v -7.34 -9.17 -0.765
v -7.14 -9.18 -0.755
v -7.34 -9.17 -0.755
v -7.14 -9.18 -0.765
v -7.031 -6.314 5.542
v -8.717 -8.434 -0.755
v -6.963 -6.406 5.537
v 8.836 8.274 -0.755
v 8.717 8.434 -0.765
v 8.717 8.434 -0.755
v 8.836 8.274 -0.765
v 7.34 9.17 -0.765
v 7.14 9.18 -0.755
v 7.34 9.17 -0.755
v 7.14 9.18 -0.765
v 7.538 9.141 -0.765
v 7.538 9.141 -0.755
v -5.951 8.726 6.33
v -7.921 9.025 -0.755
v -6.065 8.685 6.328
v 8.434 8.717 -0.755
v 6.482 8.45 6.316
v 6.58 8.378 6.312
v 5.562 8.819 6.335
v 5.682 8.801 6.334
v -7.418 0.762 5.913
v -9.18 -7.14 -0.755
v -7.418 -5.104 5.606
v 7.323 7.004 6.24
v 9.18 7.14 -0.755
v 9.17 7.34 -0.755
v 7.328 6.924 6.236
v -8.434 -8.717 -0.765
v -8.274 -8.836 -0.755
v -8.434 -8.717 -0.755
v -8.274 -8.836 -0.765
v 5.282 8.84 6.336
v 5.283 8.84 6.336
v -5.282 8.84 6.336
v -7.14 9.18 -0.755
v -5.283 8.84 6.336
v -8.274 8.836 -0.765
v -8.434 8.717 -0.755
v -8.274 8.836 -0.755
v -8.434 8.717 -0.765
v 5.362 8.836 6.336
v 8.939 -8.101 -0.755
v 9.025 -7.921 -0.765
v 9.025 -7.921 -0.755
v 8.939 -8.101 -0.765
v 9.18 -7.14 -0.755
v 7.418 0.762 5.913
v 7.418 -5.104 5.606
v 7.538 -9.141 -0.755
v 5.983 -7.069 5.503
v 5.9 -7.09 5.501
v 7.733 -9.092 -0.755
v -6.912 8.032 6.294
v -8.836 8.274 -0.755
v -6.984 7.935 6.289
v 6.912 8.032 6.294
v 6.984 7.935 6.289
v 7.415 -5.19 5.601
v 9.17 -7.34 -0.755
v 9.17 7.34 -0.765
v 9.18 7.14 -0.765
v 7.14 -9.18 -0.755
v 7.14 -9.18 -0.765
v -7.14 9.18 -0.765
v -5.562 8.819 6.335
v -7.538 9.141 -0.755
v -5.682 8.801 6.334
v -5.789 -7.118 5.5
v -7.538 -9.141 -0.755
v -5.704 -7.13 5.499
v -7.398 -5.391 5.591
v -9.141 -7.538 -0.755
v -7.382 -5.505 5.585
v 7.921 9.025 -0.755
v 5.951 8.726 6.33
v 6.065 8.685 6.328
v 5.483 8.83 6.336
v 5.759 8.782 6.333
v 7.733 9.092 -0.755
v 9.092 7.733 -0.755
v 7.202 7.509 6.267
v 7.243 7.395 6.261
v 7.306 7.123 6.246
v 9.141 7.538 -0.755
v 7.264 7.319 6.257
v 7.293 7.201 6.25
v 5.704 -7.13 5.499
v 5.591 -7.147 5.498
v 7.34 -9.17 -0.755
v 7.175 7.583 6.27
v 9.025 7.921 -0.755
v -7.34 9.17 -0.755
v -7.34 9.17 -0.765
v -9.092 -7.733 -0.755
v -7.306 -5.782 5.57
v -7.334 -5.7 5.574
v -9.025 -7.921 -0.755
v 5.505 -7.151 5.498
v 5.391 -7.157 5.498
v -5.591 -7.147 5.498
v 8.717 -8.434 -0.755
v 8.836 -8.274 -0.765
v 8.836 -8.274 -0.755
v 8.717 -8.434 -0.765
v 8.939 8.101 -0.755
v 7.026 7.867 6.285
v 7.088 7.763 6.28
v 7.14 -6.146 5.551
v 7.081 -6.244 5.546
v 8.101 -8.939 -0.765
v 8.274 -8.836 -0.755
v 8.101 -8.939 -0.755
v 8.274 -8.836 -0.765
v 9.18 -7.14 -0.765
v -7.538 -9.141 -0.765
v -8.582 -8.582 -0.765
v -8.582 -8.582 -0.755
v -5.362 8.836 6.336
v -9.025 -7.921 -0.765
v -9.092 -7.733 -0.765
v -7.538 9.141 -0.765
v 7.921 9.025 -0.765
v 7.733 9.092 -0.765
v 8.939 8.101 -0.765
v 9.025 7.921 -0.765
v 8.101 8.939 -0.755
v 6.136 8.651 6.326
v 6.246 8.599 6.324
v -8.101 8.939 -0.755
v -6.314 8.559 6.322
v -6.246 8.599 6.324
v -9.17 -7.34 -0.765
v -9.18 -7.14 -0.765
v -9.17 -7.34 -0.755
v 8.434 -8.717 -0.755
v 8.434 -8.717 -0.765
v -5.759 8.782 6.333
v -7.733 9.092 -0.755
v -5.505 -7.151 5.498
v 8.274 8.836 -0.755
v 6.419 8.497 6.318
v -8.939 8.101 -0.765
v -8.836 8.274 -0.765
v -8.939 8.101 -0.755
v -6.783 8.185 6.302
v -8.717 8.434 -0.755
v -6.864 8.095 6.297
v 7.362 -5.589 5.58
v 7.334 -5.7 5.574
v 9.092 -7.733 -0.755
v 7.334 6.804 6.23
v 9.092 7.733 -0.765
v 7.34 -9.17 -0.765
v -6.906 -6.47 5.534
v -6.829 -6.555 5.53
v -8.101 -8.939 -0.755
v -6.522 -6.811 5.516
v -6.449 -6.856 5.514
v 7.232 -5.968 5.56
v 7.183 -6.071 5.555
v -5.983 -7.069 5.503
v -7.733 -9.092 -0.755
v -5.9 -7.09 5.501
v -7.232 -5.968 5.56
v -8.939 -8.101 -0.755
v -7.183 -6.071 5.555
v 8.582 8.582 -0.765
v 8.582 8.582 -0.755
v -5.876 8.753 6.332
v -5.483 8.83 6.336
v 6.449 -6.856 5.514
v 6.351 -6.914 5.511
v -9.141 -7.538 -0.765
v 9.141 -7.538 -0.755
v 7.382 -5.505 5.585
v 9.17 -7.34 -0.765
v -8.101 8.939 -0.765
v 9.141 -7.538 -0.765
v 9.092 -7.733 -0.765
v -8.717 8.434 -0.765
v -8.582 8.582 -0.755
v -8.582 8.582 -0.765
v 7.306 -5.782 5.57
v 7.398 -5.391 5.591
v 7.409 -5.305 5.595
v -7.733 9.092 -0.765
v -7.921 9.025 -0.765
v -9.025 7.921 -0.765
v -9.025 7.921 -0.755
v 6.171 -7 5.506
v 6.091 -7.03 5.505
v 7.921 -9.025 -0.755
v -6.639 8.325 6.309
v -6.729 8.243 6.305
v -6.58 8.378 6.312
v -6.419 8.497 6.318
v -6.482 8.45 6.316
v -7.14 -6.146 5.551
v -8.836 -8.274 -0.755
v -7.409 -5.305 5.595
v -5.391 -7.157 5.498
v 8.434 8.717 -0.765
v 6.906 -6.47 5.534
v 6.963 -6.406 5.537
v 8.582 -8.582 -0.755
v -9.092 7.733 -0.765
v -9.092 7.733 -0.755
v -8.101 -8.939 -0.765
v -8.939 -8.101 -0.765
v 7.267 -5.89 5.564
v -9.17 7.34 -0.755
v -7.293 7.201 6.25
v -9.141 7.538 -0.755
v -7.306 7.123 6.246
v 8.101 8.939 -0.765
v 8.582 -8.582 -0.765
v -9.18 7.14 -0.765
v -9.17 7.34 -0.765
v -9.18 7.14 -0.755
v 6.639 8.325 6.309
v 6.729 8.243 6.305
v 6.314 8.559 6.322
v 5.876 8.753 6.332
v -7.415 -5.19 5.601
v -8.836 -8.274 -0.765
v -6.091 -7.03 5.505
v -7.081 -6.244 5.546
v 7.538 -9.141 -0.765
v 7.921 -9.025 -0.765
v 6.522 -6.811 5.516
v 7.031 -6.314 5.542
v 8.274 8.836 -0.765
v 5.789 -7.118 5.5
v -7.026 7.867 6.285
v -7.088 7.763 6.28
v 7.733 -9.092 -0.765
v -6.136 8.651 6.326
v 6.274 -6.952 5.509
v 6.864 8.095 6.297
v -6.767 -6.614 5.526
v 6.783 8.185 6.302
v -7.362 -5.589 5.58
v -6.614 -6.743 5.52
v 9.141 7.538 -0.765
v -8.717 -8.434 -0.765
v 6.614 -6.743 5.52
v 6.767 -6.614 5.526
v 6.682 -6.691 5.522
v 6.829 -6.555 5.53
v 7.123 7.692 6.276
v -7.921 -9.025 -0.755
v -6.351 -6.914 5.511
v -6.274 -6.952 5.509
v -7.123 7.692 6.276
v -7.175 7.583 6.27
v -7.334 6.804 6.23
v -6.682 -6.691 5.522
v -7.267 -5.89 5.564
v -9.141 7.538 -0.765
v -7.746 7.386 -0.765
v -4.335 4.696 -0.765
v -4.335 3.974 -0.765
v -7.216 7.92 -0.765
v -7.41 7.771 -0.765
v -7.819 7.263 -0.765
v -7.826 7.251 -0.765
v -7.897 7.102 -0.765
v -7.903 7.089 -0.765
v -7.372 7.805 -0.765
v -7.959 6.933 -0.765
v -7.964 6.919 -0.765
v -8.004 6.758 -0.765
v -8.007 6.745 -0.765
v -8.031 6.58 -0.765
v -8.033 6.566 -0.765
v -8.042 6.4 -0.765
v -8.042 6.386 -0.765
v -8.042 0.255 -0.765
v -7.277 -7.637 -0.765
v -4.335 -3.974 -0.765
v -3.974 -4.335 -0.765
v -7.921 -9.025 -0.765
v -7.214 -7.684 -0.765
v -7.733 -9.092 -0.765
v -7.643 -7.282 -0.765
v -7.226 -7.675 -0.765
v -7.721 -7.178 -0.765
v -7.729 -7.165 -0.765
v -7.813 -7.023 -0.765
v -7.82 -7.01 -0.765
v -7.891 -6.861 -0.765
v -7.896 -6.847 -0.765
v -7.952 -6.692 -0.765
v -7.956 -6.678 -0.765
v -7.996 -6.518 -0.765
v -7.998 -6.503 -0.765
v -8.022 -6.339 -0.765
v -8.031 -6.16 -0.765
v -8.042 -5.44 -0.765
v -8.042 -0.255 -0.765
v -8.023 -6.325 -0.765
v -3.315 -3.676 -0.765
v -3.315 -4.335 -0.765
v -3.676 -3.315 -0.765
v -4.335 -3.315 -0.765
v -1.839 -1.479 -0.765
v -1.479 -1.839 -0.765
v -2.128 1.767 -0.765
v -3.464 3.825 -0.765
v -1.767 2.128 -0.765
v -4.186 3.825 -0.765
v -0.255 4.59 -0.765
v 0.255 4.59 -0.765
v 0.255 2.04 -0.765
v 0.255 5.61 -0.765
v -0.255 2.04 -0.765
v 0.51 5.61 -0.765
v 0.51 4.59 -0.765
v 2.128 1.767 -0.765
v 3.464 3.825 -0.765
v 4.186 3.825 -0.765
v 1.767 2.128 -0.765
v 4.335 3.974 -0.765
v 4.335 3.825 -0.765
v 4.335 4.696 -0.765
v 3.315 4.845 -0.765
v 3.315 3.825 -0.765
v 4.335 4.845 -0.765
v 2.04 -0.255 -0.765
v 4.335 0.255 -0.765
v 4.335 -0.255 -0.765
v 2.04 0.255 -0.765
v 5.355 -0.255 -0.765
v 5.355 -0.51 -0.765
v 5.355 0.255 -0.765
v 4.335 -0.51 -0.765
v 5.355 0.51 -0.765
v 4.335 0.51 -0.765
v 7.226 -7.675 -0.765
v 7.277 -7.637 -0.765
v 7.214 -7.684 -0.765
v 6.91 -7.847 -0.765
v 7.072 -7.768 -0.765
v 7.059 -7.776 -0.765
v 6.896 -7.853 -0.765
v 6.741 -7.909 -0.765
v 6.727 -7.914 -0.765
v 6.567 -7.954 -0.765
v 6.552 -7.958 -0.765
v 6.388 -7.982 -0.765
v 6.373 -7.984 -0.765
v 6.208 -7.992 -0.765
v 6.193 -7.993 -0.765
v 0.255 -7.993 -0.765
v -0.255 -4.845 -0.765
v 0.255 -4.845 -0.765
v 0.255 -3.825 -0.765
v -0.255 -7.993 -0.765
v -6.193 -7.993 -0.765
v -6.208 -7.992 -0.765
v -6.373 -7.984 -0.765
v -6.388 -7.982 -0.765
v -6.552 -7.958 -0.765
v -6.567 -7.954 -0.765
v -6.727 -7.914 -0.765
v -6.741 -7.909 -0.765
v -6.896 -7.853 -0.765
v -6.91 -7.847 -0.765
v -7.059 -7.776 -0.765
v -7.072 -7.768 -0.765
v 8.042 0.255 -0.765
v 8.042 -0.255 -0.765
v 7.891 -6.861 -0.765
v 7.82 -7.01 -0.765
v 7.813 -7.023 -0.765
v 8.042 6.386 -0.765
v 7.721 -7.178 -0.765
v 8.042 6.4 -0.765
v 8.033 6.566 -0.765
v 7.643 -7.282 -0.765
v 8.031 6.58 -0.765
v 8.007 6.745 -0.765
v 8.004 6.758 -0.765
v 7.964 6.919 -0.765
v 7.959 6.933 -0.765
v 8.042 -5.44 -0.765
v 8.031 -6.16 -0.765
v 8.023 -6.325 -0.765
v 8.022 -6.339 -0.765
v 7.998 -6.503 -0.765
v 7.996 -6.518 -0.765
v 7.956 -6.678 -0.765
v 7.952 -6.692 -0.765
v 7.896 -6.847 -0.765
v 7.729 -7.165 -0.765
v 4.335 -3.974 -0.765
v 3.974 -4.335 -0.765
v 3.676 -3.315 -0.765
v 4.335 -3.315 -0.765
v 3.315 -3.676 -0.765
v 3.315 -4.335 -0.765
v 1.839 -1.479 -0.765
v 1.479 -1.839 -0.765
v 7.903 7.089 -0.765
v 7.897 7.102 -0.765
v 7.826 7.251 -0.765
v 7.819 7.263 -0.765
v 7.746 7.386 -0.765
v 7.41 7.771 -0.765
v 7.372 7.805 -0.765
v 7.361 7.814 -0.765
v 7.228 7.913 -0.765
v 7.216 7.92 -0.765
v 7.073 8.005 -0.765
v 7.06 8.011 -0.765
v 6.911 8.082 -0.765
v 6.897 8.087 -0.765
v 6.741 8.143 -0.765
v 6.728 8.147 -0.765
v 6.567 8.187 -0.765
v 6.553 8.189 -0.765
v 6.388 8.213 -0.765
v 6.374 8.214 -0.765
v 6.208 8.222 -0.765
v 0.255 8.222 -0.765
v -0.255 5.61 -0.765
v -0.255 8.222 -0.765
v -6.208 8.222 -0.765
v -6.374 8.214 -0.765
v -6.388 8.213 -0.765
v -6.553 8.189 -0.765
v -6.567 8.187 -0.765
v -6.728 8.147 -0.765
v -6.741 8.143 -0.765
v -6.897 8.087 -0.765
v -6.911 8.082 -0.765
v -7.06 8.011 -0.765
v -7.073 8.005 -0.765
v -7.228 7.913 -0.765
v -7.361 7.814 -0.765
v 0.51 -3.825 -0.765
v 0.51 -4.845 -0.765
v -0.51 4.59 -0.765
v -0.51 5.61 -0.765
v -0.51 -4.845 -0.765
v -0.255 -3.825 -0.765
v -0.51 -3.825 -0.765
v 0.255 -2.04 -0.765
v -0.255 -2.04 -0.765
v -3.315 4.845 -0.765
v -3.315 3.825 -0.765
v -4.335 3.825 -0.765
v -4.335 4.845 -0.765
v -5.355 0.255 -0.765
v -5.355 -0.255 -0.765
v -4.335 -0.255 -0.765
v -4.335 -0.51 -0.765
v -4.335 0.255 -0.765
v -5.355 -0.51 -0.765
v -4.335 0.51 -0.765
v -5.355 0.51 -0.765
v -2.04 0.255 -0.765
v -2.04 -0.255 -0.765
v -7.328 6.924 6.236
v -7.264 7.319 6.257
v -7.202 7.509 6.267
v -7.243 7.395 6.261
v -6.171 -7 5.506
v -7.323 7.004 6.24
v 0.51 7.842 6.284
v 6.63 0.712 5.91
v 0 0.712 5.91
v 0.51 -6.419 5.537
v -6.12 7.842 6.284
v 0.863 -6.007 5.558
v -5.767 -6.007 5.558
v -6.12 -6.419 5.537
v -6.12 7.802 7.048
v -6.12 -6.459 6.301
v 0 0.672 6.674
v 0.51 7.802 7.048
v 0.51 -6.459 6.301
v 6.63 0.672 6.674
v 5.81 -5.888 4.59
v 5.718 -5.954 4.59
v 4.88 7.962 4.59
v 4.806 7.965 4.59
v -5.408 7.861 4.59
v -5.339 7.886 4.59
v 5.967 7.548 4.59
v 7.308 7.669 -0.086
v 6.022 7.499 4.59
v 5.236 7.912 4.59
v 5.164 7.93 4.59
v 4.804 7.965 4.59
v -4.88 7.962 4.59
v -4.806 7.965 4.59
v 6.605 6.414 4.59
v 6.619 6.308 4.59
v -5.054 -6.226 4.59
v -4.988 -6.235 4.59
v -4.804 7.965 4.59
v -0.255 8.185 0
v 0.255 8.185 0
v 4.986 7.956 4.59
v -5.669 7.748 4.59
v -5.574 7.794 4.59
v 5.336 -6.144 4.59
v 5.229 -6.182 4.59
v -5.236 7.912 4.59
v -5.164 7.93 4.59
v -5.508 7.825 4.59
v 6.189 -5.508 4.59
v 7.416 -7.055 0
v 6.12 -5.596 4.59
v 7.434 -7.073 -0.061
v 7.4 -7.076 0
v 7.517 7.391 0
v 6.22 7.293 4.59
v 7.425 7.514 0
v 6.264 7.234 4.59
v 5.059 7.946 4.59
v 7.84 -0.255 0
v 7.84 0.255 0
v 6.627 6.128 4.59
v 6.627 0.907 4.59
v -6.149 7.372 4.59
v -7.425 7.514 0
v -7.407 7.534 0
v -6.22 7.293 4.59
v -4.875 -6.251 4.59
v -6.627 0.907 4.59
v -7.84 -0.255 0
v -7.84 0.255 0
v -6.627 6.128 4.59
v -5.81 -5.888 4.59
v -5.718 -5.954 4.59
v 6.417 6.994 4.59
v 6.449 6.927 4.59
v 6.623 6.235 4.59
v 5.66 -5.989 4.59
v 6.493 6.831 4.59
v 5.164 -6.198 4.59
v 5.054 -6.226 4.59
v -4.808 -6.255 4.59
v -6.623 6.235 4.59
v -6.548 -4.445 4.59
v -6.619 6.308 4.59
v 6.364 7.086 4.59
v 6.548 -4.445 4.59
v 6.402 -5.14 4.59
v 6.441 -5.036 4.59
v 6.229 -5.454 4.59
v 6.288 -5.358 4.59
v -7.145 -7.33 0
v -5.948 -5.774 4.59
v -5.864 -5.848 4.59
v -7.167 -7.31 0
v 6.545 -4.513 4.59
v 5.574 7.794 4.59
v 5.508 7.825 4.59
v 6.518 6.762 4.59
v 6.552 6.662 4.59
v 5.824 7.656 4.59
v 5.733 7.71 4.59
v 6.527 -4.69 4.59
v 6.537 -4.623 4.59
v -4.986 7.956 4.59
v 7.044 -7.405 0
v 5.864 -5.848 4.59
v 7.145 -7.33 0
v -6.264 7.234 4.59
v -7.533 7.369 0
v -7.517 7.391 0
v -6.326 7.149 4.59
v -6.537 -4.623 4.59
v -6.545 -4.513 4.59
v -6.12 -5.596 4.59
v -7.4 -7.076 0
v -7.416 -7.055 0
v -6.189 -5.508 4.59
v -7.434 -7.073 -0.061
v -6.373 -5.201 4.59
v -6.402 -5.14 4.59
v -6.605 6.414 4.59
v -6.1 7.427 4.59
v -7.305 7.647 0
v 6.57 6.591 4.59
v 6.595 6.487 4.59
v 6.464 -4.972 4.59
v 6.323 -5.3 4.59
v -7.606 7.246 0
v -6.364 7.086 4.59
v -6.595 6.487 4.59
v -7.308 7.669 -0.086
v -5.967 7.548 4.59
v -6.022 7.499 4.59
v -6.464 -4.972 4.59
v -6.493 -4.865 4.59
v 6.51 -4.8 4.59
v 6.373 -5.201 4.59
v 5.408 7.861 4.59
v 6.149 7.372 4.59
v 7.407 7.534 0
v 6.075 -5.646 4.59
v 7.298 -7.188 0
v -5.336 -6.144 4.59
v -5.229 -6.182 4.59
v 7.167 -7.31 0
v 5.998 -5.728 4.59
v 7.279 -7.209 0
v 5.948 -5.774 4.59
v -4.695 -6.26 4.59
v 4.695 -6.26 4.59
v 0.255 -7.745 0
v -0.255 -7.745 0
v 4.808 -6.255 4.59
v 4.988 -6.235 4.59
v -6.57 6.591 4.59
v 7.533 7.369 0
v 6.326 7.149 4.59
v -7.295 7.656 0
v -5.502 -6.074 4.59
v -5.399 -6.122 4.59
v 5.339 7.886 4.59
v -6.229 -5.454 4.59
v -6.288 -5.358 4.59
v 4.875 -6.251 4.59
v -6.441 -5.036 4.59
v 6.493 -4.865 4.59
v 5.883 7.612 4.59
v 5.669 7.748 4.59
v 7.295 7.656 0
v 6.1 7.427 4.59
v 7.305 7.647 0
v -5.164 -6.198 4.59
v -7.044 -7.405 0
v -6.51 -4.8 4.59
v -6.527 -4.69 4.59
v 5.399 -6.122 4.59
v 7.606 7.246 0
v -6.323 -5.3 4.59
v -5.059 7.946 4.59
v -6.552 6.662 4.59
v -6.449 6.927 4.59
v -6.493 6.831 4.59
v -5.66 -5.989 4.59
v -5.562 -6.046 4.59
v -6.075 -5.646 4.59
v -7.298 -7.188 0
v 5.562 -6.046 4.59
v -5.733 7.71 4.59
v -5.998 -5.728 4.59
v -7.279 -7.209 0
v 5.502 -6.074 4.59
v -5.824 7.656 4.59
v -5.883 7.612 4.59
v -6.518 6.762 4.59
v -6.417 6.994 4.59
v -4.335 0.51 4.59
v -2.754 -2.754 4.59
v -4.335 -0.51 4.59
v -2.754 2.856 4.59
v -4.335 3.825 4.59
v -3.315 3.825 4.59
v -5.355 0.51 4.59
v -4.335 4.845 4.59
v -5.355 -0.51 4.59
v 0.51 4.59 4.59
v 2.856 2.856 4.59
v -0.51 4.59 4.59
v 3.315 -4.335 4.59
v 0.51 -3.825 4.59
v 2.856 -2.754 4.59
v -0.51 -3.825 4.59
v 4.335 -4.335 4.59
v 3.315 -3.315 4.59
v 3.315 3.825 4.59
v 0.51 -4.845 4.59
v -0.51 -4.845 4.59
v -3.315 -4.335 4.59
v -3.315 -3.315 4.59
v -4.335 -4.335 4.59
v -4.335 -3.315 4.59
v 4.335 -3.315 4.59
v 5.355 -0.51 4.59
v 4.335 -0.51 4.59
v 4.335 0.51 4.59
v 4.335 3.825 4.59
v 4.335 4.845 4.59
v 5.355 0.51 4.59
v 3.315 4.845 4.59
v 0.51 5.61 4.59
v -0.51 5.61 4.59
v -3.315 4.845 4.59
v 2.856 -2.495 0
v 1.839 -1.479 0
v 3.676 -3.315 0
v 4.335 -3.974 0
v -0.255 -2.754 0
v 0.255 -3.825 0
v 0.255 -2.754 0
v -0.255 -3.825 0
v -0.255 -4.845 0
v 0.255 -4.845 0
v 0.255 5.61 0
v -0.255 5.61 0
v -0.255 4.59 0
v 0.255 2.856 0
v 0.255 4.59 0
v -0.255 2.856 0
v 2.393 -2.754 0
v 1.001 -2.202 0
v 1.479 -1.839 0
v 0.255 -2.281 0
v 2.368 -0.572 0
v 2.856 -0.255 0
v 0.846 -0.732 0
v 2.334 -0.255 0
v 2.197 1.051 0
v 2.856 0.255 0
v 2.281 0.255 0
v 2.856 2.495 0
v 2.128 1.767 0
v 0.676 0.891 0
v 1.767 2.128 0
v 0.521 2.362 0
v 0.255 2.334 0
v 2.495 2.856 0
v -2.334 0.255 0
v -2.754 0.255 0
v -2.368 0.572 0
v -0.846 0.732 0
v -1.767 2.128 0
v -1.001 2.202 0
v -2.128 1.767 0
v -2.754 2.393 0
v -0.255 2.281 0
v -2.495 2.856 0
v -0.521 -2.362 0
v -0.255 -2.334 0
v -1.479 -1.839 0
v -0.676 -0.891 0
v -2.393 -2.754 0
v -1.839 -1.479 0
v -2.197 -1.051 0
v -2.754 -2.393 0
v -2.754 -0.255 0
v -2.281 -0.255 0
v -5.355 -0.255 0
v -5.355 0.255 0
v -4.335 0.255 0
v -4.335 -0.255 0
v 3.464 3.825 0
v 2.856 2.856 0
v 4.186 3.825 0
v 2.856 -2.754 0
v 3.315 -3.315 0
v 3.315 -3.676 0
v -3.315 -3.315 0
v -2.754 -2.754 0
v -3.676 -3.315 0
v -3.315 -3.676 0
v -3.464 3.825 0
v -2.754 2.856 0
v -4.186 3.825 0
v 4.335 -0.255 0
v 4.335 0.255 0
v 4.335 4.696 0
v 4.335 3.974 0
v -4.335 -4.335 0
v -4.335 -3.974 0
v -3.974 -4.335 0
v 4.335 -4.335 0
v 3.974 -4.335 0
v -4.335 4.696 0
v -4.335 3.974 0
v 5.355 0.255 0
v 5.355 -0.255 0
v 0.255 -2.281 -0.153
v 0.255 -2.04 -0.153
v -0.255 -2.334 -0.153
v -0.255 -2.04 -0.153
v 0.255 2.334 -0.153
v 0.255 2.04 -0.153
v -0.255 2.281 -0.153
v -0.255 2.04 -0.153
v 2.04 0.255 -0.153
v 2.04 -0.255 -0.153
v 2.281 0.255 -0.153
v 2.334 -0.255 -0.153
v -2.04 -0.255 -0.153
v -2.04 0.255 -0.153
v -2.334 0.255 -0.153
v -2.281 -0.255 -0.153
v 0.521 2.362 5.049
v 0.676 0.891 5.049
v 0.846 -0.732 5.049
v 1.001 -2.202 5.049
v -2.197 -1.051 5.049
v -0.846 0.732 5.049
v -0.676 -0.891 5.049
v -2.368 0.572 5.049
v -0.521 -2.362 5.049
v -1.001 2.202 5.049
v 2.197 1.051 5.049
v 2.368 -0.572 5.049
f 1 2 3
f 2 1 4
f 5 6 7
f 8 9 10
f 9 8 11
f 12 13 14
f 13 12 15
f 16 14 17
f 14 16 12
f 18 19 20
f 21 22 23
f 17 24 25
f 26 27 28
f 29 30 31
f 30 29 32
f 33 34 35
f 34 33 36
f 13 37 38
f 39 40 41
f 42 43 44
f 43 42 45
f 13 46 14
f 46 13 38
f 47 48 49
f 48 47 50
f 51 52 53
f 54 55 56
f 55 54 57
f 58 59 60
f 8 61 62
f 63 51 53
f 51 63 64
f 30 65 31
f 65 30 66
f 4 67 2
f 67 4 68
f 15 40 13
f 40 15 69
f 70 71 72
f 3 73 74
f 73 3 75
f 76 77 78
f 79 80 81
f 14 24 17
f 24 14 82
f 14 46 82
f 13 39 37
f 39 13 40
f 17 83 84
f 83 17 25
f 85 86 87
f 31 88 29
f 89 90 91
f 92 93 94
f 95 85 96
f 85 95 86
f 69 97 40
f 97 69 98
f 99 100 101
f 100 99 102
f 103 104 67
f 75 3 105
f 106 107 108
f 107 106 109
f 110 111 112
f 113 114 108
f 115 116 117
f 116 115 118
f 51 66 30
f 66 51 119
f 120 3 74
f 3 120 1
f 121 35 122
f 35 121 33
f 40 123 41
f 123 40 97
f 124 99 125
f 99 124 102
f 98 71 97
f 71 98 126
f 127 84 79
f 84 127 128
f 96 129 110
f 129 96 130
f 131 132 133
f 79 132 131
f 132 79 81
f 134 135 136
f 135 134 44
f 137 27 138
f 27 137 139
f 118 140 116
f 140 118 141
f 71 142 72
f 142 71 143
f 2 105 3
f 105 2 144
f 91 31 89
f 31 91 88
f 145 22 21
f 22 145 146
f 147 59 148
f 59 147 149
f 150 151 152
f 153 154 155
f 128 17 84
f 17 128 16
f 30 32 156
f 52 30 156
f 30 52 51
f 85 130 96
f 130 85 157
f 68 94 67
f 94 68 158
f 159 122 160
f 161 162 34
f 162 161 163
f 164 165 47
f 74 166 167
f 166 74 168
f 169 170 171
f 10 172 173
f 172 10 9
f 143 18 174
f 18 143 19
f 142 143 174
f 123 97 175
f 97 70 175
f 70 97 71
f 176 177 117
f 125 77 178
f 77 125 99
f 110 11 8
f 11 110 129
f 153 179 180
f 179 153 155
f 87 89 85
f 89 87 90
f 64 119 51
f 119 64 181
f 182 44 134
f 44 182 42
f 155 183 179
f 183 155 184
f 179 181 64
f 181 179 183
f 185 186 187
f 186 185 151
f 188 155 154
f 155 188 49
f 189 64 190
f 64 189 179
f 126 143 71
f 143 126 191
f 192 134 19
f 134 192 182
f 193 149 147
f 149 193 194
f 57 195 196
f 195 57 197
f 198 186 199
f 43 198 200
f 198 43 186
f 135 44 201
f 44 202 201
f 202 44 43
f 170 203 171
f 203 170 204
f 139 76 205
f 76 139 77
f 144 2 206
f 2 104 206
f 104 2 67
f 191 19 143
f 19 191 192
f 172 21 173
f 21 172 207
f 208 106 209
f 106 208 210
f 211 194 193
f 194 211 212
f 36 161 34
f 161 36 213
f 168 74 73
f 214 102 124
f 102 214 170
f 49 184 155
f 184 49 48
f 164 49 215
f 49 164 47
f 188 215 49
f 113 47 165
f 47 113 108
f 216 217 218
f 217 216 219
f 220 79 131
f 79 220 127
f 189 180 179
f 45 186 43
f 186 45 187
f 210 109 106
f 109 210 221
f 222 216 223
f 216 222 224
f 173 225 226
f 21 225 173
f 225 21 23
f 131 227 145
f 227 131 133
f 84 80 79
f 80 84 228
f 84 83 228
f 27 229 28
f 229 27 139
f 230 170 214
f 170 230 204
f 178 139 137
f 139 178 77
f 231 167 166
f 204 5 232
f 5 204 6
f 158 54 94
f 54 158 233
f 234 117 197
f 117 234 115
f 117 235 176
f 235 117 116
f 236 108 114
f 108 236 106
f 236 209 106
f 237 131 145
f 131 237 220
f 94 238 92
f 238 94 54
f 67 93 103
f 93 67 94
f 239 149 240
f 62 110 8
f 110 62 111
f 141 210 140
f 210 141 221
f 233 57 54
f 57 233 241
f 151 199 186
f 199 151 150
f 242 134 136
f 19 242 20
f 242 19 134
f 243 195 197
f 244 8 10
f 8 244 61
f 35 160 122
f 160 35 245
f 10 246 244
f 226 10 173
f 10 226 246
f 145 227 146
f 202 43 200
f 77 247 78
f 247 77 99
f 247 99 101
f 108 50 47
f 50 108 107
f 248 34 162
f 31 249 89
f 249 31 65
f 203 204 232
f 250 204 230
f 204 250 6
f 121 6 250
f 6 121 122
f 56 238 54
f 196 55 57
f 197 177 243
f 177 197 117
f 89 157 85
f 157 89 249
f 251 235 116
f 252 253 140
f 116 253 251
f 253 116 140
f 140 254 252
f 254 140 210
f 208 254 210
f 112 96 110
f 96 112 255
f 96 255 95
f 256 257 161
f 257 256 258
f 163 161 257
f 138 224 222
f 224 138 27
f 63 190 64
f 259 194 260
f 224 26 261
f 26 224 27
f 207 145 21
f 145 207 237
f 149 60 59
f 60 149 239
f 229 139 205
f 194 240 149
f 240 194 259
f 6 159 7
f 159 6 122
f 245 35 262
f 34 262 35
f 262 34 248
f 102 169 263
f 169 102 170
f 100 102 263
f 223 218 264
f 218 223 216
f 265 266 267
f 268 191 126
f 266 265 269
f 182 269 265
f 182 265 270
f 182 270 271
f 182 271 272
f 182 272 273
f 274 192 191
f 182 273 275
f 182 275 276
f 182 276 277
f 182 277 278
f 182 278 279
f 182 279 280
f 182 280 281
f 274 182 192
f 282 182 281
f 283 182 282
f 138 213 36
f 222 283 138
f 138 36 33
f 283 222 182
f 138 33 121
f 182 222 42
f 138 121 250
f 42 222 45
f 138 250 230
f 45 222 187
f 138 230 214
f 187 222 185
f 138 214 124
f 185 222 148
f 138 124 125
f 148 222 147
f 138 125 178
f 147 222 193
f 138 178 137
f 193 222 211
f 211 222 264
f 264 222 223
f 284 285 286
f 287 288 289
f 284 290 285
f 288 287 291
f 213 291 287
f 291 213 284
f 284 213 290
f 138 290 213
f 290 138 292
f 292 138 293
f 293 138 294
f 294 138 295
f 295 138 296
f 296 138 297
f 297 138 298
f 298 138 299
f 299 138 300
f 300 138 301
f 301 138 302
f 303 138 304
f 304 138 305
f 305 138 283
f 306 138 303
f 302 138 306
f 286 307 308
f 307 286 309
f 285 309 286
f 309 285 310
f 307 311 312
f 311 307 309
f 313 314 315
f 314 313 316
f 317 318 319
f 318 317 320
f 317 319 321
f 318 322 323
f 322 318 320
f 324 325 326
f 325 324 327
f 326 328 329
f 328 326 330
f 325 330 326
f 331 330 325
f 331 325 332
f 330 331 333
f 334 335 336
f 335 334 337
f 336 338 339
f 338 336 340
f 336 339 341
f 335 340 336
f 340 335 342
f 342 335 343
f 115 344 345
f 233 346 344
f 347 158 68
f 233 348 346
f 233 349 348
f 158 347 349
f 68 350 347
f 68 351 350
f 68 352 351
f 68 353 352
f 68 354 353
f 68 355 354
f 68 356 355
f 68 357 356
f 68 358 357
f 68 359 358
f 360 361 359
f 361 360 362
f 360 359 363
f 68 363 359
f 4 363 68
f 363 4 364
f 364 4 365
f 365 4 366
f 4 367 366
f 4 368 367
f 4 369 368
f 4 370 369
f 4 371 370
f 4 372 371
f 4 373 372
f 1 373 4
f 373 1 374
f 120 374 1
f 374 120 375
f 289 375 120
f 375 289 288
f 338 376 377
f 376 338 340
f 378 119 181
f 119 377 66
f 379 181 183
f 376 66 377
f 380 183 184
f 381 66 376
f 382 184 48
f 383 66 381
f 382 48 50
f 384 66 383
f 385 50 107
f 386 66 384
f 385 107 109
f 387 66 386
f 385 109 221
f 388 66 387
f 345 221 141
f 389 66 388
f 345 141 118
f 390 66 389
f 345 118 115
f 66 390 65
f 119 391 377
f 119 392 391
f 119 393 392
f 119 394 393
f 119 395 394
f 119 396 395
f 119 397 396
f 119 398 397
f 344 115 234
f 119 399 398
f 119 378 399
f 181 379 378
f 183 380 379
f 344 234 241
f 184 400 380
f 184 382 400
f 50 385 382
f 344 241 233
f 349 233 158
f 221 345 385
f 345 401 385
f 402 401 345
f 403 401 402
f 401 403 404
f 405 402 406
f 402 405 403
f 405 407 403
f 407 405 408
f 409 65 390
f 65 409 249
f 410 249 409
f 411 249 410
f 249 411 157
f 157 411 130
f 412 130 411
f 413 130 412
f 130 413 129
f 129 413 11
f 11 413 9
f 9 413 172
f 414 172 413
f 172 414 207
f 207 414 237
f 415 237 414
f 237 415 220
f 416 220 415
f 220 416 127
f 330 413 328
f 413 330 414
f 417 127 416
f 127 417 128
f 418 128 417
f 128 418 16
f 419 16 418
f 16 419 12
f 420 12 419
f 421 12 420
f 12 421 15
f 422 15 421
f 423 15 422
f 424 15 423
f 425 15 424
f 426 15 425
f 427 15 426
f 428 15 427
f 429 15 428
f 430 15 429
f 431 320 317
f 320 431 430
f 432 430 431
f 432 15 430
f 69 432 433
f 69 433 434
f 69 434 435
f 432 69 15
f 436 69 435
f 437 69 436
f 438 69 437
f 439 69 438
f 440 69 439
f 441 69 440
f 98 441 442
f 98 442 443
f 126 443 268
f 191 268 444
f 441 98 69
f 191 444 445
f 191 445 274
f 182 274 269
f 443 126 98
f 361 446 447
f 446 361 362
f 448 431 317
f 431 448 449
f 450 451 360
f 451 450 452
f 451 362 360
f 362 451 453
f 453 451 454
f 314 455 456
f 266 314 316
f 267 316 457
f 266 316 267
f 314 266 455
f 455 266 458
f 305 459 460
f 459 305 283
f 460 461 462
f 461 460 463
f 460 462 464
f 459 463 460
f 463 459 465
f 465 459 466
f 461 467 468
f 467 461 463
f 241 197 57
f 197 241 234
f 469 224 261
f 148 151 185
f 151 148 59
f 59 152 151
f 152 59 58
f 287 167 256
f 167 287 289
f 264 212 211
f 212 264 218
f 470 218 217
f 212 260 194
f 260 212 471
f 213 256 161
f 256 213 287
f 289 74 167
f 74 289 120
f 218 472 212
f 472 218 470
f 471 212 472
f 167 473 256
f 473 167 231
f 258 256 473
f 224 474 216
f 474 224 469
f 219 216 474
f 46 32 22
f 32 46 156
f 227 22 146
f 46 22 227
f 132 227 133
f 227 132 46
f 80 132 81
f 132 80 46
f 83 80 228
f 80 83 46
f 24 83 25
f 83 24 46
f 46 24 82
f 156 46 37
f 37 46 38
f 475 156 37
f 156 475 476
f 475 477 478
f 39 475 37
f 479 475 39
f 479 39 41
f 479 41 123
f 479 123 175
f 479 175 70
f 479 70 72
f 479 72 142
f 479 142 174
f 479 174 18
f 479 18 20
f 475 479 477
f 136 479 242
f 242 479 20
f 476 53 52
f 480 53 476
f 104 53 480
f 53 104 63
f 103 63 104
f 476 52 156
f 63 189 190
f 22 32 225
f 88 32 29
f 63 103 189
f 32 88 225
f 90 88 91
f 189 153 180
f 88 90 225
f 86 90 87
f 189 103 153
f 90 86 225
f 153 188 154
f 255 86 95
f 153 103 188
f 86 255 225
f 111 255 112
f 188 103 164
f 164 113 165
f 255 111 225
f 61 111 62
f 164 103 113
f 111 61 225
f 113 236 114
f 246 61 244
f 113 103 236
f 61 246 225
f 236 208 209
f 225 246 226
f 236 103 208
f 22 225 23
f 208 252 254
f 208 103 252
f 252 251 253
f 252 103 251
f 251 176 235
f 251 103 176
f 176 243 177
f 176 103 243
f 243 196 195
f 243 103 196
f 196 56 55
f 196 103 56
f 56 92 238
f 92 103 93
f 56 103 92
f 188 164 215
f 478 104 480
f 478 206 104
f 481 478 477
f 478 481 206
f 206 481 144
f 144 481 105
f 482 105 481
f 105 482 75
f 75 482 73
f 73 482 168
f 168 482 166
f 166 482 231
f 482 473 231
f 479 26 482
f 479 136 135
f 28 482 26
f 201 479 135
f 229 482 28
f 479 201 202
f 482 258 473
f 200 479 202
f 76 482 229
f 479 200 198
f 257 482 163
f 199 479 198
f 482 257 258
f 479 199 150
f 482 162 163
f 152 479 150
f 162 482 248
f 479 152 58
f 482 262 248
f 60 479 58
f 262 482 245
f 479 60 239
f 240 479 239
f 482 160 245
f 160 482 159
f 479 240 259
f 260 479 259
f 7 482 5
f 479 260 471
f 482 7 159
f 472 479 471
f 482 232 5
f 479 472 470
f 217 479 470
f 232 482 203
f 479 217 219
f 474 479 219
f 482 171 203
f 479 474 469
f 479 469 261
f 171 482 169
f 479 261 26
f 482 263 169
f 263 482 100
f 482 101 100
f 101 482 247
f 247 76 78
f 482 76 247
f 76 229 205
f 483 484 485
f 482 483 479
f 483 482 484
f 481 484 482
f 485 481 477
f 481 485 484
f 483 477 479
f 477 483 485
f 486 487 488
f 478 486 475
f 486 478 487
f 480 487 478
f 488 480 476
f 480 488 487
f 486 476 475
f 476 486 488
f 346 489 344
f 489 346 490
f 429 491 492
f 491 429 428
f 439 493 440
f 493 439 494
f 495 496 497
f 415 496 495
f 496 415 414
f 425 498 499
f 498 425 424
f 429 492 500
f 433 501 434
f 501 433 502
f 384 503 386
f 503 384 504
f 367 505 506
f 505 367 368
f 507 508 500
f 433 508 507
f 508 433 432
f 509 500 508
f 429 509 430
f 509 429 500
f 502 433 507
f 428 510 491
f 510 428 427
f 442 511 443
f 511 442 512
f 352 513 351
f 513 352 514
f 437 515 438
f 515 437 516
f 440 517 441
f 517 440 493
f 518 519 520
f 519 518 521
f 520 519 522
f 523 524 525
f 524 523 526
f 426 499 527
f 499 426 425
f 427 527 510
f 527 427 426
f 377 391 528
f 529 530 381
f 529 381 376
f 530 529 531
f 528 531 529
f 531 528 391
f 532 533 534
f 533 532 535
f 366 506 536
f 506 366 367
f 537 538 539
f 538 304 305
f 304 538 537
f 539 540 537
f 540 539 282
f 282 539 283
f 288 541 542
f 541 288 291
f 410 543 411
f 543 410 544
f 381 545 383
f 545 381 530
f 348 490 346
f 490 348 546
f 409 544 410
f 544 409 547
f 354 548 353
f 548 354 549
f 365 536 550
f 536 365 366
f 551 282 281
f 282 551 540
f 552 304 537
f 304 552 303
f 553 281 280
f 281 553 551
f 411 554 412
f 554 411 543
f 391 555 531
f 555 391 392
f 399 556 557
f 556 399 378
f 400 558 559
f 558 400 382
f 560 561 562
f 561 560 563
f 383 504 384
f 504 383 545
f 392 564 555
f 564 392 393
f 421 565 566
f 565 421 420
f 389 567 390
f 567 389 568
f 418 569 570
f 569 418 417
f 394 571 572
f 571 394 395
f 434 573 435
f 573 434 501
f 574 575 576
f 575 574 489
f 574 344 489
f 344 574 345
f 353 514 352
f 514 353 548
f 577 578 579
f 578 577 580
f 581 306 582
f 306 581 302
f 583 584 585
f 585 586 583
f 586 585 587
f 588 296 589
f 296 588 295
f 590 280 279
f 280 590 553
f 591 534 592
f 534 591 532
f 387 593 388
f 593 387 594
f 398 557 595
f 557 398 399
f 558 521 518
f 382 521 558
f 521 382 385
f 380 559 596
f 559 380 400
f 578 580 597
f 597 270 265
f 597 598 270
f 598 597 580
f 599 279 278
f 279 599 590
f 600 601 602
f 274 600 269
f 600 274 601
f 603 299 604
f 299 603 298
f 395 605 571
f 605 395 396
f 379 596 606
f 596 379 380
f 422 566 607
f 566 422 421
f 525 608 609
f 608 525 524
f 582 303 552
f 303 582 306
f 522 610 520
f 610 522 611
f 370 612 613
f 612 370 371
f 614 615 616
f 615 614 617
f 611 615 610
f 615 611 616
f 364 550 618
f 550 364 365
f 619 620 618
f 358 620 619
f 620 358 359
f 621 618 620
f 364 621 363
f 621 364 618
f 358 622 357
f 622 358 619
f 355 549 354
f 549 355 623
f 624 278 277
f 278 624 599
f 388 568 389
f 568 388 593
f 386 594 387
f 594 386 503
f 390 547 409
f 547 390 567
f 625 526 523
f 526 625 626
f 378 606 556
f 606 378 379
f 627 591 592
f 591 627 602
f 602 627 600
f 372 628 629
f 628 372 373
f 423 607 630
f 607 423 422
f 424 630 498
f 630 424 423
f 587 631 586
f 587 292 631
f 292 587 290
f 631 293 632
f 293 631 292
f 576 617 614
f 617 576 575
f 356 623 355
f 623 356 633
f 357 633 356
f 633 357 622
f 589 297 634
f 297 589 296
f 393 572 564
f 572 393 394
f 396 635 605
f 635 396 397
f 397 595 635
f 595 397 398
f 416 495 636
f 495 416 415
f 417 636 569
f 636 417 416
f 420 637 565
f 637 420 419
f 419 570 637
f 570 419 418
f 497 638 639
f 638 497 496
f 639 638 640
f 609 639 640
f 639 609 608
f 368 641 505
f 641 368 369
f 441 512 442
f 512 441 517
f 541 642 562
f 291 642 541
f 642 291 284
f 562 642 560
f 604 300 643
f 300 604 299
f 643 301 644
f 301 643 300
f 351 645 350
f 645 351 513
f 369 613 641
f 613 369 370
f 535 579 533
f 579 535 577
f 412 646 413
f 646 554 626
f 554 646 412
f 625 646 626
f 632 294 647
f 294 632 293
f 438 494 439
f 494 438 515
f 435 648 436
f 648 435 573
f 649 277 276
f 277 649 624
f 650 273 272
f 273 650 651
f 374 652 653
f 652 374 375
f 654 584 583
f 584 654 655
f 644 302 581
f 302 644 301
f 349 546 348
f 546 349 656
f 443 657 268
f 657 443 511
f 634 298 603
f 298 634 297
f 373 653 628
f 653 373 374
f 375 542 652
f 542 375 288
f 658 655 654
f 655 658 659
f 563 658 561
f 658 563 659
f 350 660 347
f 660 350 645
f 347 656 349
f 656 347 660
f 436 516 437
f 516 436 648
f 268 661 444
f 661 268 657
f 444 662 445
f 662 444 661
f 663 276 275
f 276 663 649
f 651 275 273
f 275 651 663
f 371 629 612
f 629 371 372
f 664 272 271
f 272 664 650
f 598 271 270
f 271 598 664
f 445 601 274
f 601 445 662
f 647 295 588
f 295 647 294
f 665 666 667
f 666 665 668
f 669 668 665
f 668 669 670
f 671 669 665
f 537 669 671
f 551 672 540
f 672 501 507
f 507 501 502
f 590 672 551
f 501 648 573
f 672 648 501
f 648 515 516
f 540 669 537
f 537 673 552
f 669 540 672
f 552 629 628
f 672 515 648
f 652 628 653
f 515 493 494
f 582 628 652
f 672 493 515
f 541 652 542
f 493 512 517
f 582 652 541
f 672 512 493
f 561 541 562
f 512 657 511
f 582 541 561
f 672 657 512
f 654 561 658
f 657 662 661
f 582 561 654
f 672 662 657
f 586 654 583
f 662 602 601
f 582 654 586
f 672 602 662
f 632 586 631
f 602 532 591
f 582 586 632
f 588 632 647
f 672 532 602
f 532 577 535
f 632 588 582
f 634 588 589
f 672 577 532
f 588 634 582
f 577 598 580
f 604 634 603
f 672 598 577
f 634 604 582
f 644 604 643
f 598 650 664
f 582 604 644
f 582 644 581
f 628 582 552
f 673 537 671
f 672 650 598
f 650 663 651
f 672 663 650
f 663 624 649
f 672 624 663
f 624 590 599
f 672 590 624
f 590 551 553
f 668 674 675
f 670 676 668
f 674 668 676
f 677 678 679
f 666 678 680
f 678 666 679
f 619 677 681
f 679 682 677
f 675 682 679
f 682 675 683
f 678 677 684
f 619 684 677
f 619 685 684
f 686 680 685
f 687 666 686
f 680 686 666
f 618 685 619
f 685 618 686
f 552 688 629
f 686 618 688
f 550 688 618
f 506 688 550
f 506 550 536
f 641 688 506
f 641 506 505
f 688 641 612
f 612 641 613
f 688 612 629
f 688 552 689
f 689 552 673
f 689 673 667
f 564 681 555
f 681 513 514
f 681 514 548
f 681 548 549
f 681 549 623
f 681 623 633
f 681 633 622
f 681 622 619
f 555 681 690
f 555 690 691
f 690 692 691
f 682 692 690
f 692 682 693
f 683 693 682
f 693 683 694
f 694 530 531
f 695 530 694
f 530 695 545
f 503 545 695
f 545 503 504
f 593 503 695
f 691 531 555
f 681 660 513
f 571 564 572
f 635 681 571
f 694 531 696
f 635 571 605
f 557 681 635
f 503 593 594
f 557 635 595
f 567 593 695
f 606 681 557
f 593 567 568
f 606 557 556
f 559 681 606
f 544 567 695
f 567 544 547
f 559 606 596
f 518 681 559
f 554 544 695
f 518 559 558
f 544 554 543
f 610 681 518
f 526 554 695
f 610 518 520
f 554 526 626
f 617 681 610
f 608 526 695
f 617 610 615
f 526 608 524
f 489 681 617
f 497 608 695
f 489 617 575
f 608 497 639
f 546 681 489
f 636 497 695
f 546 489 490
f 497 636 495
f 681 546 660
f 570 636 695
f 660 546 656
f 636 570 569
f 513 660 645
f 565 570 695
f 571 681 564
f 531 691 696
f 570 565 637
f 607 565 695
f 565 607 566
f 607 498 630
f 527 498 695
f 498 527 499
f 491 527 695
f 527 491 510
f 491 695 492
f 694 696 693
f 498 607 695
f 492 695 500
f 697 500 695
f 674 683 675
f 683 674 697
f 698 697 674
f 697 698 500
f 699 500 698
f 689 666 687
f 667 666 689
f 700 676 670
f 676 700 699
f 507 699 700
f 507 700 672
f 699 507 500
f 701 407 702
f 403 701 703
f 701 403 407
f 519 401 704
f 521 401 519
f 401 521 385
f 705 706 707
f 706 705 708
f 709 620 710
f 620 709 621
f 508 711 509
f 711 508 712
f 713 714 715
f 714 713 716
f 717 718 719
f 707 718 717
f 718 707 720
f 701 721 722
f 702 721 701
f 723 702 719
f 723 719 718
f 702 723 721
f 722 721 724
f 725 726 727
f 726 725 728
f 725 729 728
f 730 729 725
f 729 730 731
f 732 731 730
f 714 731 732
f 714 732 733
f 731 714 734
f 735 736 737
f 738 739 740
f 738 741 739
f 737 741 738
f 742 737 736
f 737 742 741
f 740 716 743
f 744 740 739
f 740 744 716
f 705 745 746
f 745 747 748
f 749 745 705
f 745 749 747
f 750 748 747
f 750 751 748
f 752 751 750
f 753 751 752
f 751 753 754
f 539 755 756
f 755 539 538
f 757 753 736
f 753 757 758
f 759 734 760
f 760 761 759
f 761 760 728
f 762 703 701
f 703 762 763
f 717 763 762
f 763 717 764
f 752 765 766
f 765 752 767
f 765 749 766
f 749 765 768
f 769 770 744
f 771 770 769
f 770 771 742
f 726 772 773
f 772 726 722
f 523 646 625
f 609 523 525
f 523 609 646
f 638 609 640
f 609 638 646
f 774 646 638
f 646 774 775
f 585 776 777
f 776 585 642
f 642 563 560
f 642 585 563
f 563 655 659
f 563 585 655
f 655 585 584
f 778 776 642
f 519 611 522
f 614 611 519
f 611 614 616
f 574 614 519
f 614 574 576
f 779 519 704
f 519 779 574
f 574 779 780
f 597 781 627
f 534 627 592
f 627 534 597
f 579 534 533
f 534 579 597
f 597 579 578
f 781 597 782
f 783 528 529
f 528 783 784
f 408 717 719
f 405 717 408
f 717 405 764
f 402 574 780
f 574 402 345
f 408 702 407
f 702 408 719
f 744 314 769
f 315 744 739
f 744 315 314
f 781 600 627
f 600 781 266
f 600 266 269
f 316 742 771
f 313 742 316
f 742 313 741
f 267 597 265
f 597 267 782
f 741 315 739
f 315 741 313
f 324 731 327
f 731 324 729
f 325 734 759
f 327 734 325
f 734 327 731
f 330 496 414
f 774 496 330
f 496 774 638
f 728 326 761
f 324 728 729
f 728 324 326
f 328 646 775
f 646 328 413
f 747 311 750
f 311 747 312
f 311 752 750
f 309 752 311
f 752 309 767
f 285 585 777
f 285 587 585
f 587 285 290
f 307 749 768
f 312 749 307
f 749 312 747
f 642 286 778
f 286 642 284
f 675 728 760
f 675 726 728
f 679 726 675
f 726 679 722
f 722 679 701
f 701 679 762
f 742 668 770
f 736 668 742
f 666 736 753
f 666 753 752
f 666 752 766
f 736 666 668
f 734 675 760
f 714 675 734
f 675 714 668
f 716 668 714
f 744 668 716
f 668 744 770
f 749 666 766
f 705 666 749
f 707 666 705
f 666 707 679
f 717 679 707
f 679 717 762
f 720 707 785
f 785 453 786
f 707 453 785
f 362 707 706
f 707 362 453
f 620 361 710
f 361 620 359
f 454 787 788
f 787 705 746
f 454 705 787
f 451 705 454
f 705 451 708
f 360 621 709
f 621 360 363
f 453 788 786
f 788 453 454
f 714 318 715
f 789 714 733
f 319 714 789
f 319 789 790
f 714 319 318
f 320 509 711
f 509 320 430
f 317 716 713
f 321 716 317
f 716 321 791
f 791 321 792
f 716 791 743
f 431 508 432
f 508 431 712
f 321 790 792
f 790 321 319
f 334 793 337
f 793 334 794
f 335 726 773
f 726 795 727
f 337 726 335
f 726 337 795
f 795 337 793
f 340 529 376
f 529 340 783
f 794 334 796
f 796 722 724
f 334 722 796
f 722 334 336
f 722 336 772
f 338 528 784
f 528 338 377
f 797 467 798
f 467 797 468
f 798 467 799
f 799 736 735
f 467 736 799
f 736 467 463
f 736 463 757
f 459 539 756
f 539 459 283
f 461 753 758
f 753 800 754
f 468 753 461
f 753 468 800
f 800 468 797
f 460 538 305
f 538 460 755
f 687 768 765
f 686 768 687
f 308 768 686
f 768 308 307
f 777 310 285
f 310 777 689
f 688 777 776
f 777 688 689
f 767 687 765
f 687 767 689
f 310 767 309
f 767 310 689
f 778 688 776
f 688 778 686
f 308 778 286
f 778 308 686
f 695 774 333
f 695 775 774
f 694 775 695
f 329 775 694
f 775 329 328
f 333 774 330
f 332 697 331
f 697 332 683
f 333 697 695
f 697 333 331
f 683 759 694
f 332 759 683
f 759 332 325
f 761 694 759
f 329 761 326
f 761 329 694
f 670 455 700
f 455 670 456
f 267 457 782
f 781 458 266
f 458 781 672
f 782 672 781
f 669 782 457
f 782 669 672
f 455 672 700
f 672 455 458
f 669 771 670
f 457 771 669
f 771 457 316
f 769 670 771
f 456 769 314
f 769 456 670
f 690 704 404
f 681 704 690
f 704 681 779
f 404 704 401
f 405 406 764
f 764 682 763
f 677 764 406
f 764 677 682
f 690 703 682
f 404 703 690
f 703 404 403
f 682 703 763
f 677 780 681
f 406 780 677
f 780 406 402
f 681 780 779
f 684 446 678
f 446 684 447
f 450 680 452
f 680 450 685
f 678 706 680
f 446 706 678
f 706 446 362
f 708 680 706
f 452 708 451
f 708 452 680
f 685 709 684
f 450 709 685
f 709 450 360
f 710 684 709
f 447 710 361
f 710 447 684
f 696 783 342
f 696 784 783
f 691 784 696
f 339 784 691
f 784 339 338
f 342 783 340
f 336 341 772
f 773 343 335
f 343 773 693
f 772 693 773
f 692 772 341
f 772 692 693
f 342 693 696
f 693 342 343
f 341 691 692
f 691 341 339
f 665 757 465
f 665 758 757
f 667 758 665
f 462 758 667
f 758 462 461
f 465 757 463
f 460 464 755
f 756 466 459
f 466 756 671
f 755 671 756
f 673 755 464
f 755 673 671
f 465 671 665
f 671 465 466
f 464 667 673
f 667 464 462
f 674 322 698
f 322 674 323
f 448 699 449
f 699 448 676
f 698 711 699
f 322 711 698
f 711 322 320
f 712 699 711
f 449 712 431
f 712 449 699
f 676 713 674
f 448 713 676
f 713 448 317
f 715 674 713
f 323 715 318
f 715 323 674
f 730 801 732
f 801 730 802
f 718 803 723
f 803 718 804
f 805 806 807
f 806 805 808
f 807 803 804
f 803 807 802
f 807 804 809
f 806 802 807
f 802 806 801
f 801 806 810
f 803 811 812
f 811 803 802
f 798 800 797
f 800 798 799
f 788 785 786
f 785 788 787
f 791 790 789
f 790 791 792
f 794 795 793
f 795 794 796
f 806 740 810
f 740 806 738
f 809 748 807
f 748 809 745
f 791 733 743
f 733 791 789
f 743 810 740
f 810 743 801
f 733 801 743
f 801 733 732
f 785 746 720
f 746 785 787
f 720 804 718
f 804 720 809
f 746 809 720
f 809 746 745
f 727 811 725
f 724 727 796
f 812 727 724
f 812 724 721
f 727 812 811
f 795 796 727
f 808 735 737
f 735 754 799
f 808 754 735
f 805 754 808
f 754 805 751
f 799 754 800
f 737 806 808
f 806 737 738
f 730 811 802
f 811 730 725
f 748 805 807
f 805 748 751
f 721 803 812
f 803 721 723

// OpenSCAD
// Row 4 decorated Cherry MX key

// dimensions Cherry MX connector
c_corr = .5;                // tolerance
c_horiz = 1.1;              // horizontal bar width
c_vert = 1.0;               // vertical bar width
c_dia = 4;                  // cross width
c_depth = 5;                // connector depth
c_space = 4;                // height of hollow inside
c_inset = 0.75;              // distance connector start to keycap base

// decoration
obj = "semiquaver.stl";          // decoration object
obj_pos = [-3.25,-4.5,5.5];        // decoration offset
factor_em = 0.1;
obj_scale = [1.1*factor_em,1.1*factor_em,1.3*factor_em]; // decoration scale
obj_rot = [3,0,0];          // decoration rotation

// keycap shape
head_tilt = 3;              // rotation of top around x-axis
head_pos = 2.25;            // keycap top y-offset
head_height = 11;           // z-offset of keycap top from the bottom of the keycap
cutoff = 6.5;               // cut keycap here to make room for decoration
                            // must be bigger than c_space + c_corr
key_scale = [1.02,1.02,1.02]; // overall scale

// stuff
$fn = 64;

//triangle
b = 10;
h = 10;
w = 13;

// create basic key shape from dxf frames for base and top
module shape()
{
    hull()
    {
        translate([0,0,-c_inset]) linear_extrude(height=.01) import("base.dxf");
        rotate([head_tilt,0,0]) translate([0,6.75+head_pos,head_height-c_inset]) linear_extrude(height=.01) import("top.dxf");
    }
}

// construct the connector pin
module connector() 
{
    
		rotate([0,0,6]) translate([0,0,c_depth/2-.1]) union()
    {
        cube([c_vert+c_corr,c_dia+c_corr,c_depth+.1], center=true );
        cube([c_dia+c_corr,c_horiz+c_corr,c_depth+.1], center=true );
    }
}

// create the hollow key with decoration
module key()
{
    difference()
    {
        // combine basic key shape with decoration
        union()
        {
				rotate([head_tilt,0,0]) translate([-1,0,0]) linear_extrude(height = w, center = true, convexity = 10, twist = 0					)
				polygon(points=[[-5,-6],[1,1],[-5,8]], paths=[[0,1,2]]);
				rotate([head_tilt,0,0]) translate([5.5,0,0]) linear_extrude(height = w, center = true, convexity = 10, twist = 0					)
				polygon(points=[[-5,-6],[1,1],[-5,8]], paths=[[0,1,2]]);
				// end design
// end design
            difference()
            {
                shape();
                rotate([head_tilt,0,0]) translate([0,0,5+cutoff-c_inset]) cube([100,100,10], center=true);
            }
        }

        // subtract scaled basic shape, cut at minimum required height
        difference()
        {
            scale([.9,.9,.9]) translate([0,0,-1]) shape();
            translate([0,0,5+c_space+c_corr]) cube([100,100,10], center=true);
        }
    }
}

// combine key, pin and connector. cleanup below the key
scale(key_scale) difference()
{
    union() 
    { 
        key();

			translate([-2.7,-2.7,0]) cube(size = [(c_dia+1+c_corr),(c_dia+1+c_corr),c_space+c_corr], center = false);
			//RTS support structure
			//connector
			rotate([0,0,45])
			{
				translate([-0.25,-11.3,-0.75]) cube([0.5,9,0.75], center=false);
				translate([-0.25,2.7,-0.75])  cube([0.5,8.5,0.75], center=false);
				translate([2.7,-0.25,-0.75])  cube([8.5,0.5,0.75], center=false);
				translate([-11.3,-0.25,-0.75]) cube([9,0.5,0.75], center=false);
			}
			translate([-0.25,-8.5,-0.75]) cube([0.5,6.5,0.75], center=false);
			translate([-0.25,2,-0.75])  cube([0.5,6.5,0.75], center=false);
			translate([2,-0.25,-0.75])  cube([6.5,0.5,0.75], center=false);
			translate([-8.5,-0.25,-0.75]) cube([6.5,0.5,0.75], center=false);		
			//roof
			translate([-4.25,-4.25,-0.75]) cube([1,1,6], center=false);		
			translate([3.25,3.75,-0.75])   cube([1,1,6], center=false);		
			translate([-4.25,3.75,-0.75])  cube([1,1,6], center=false);		
			translate([3.25,-4.25,-0.75])  cube([1,1,6], center=false);		
			
			translate([-0.5,-4.75,-0.75]) cube([1,1,6], center=false);		
			translate([4.25,-0.5,-0.75])   cube([1,1,6], center=false);		
			translate([-5.25,-0.5,-0.75])  cube([1,1,6], center=false);		
			translate([-0.5,4.5,-0.75])  cube([1,1,6], center=false);		
			
			//END RTS support structure 
	}
    
	connector();	

	translate([0,0,-50-c_inset]) cube([100,100,100], center=true);

}
